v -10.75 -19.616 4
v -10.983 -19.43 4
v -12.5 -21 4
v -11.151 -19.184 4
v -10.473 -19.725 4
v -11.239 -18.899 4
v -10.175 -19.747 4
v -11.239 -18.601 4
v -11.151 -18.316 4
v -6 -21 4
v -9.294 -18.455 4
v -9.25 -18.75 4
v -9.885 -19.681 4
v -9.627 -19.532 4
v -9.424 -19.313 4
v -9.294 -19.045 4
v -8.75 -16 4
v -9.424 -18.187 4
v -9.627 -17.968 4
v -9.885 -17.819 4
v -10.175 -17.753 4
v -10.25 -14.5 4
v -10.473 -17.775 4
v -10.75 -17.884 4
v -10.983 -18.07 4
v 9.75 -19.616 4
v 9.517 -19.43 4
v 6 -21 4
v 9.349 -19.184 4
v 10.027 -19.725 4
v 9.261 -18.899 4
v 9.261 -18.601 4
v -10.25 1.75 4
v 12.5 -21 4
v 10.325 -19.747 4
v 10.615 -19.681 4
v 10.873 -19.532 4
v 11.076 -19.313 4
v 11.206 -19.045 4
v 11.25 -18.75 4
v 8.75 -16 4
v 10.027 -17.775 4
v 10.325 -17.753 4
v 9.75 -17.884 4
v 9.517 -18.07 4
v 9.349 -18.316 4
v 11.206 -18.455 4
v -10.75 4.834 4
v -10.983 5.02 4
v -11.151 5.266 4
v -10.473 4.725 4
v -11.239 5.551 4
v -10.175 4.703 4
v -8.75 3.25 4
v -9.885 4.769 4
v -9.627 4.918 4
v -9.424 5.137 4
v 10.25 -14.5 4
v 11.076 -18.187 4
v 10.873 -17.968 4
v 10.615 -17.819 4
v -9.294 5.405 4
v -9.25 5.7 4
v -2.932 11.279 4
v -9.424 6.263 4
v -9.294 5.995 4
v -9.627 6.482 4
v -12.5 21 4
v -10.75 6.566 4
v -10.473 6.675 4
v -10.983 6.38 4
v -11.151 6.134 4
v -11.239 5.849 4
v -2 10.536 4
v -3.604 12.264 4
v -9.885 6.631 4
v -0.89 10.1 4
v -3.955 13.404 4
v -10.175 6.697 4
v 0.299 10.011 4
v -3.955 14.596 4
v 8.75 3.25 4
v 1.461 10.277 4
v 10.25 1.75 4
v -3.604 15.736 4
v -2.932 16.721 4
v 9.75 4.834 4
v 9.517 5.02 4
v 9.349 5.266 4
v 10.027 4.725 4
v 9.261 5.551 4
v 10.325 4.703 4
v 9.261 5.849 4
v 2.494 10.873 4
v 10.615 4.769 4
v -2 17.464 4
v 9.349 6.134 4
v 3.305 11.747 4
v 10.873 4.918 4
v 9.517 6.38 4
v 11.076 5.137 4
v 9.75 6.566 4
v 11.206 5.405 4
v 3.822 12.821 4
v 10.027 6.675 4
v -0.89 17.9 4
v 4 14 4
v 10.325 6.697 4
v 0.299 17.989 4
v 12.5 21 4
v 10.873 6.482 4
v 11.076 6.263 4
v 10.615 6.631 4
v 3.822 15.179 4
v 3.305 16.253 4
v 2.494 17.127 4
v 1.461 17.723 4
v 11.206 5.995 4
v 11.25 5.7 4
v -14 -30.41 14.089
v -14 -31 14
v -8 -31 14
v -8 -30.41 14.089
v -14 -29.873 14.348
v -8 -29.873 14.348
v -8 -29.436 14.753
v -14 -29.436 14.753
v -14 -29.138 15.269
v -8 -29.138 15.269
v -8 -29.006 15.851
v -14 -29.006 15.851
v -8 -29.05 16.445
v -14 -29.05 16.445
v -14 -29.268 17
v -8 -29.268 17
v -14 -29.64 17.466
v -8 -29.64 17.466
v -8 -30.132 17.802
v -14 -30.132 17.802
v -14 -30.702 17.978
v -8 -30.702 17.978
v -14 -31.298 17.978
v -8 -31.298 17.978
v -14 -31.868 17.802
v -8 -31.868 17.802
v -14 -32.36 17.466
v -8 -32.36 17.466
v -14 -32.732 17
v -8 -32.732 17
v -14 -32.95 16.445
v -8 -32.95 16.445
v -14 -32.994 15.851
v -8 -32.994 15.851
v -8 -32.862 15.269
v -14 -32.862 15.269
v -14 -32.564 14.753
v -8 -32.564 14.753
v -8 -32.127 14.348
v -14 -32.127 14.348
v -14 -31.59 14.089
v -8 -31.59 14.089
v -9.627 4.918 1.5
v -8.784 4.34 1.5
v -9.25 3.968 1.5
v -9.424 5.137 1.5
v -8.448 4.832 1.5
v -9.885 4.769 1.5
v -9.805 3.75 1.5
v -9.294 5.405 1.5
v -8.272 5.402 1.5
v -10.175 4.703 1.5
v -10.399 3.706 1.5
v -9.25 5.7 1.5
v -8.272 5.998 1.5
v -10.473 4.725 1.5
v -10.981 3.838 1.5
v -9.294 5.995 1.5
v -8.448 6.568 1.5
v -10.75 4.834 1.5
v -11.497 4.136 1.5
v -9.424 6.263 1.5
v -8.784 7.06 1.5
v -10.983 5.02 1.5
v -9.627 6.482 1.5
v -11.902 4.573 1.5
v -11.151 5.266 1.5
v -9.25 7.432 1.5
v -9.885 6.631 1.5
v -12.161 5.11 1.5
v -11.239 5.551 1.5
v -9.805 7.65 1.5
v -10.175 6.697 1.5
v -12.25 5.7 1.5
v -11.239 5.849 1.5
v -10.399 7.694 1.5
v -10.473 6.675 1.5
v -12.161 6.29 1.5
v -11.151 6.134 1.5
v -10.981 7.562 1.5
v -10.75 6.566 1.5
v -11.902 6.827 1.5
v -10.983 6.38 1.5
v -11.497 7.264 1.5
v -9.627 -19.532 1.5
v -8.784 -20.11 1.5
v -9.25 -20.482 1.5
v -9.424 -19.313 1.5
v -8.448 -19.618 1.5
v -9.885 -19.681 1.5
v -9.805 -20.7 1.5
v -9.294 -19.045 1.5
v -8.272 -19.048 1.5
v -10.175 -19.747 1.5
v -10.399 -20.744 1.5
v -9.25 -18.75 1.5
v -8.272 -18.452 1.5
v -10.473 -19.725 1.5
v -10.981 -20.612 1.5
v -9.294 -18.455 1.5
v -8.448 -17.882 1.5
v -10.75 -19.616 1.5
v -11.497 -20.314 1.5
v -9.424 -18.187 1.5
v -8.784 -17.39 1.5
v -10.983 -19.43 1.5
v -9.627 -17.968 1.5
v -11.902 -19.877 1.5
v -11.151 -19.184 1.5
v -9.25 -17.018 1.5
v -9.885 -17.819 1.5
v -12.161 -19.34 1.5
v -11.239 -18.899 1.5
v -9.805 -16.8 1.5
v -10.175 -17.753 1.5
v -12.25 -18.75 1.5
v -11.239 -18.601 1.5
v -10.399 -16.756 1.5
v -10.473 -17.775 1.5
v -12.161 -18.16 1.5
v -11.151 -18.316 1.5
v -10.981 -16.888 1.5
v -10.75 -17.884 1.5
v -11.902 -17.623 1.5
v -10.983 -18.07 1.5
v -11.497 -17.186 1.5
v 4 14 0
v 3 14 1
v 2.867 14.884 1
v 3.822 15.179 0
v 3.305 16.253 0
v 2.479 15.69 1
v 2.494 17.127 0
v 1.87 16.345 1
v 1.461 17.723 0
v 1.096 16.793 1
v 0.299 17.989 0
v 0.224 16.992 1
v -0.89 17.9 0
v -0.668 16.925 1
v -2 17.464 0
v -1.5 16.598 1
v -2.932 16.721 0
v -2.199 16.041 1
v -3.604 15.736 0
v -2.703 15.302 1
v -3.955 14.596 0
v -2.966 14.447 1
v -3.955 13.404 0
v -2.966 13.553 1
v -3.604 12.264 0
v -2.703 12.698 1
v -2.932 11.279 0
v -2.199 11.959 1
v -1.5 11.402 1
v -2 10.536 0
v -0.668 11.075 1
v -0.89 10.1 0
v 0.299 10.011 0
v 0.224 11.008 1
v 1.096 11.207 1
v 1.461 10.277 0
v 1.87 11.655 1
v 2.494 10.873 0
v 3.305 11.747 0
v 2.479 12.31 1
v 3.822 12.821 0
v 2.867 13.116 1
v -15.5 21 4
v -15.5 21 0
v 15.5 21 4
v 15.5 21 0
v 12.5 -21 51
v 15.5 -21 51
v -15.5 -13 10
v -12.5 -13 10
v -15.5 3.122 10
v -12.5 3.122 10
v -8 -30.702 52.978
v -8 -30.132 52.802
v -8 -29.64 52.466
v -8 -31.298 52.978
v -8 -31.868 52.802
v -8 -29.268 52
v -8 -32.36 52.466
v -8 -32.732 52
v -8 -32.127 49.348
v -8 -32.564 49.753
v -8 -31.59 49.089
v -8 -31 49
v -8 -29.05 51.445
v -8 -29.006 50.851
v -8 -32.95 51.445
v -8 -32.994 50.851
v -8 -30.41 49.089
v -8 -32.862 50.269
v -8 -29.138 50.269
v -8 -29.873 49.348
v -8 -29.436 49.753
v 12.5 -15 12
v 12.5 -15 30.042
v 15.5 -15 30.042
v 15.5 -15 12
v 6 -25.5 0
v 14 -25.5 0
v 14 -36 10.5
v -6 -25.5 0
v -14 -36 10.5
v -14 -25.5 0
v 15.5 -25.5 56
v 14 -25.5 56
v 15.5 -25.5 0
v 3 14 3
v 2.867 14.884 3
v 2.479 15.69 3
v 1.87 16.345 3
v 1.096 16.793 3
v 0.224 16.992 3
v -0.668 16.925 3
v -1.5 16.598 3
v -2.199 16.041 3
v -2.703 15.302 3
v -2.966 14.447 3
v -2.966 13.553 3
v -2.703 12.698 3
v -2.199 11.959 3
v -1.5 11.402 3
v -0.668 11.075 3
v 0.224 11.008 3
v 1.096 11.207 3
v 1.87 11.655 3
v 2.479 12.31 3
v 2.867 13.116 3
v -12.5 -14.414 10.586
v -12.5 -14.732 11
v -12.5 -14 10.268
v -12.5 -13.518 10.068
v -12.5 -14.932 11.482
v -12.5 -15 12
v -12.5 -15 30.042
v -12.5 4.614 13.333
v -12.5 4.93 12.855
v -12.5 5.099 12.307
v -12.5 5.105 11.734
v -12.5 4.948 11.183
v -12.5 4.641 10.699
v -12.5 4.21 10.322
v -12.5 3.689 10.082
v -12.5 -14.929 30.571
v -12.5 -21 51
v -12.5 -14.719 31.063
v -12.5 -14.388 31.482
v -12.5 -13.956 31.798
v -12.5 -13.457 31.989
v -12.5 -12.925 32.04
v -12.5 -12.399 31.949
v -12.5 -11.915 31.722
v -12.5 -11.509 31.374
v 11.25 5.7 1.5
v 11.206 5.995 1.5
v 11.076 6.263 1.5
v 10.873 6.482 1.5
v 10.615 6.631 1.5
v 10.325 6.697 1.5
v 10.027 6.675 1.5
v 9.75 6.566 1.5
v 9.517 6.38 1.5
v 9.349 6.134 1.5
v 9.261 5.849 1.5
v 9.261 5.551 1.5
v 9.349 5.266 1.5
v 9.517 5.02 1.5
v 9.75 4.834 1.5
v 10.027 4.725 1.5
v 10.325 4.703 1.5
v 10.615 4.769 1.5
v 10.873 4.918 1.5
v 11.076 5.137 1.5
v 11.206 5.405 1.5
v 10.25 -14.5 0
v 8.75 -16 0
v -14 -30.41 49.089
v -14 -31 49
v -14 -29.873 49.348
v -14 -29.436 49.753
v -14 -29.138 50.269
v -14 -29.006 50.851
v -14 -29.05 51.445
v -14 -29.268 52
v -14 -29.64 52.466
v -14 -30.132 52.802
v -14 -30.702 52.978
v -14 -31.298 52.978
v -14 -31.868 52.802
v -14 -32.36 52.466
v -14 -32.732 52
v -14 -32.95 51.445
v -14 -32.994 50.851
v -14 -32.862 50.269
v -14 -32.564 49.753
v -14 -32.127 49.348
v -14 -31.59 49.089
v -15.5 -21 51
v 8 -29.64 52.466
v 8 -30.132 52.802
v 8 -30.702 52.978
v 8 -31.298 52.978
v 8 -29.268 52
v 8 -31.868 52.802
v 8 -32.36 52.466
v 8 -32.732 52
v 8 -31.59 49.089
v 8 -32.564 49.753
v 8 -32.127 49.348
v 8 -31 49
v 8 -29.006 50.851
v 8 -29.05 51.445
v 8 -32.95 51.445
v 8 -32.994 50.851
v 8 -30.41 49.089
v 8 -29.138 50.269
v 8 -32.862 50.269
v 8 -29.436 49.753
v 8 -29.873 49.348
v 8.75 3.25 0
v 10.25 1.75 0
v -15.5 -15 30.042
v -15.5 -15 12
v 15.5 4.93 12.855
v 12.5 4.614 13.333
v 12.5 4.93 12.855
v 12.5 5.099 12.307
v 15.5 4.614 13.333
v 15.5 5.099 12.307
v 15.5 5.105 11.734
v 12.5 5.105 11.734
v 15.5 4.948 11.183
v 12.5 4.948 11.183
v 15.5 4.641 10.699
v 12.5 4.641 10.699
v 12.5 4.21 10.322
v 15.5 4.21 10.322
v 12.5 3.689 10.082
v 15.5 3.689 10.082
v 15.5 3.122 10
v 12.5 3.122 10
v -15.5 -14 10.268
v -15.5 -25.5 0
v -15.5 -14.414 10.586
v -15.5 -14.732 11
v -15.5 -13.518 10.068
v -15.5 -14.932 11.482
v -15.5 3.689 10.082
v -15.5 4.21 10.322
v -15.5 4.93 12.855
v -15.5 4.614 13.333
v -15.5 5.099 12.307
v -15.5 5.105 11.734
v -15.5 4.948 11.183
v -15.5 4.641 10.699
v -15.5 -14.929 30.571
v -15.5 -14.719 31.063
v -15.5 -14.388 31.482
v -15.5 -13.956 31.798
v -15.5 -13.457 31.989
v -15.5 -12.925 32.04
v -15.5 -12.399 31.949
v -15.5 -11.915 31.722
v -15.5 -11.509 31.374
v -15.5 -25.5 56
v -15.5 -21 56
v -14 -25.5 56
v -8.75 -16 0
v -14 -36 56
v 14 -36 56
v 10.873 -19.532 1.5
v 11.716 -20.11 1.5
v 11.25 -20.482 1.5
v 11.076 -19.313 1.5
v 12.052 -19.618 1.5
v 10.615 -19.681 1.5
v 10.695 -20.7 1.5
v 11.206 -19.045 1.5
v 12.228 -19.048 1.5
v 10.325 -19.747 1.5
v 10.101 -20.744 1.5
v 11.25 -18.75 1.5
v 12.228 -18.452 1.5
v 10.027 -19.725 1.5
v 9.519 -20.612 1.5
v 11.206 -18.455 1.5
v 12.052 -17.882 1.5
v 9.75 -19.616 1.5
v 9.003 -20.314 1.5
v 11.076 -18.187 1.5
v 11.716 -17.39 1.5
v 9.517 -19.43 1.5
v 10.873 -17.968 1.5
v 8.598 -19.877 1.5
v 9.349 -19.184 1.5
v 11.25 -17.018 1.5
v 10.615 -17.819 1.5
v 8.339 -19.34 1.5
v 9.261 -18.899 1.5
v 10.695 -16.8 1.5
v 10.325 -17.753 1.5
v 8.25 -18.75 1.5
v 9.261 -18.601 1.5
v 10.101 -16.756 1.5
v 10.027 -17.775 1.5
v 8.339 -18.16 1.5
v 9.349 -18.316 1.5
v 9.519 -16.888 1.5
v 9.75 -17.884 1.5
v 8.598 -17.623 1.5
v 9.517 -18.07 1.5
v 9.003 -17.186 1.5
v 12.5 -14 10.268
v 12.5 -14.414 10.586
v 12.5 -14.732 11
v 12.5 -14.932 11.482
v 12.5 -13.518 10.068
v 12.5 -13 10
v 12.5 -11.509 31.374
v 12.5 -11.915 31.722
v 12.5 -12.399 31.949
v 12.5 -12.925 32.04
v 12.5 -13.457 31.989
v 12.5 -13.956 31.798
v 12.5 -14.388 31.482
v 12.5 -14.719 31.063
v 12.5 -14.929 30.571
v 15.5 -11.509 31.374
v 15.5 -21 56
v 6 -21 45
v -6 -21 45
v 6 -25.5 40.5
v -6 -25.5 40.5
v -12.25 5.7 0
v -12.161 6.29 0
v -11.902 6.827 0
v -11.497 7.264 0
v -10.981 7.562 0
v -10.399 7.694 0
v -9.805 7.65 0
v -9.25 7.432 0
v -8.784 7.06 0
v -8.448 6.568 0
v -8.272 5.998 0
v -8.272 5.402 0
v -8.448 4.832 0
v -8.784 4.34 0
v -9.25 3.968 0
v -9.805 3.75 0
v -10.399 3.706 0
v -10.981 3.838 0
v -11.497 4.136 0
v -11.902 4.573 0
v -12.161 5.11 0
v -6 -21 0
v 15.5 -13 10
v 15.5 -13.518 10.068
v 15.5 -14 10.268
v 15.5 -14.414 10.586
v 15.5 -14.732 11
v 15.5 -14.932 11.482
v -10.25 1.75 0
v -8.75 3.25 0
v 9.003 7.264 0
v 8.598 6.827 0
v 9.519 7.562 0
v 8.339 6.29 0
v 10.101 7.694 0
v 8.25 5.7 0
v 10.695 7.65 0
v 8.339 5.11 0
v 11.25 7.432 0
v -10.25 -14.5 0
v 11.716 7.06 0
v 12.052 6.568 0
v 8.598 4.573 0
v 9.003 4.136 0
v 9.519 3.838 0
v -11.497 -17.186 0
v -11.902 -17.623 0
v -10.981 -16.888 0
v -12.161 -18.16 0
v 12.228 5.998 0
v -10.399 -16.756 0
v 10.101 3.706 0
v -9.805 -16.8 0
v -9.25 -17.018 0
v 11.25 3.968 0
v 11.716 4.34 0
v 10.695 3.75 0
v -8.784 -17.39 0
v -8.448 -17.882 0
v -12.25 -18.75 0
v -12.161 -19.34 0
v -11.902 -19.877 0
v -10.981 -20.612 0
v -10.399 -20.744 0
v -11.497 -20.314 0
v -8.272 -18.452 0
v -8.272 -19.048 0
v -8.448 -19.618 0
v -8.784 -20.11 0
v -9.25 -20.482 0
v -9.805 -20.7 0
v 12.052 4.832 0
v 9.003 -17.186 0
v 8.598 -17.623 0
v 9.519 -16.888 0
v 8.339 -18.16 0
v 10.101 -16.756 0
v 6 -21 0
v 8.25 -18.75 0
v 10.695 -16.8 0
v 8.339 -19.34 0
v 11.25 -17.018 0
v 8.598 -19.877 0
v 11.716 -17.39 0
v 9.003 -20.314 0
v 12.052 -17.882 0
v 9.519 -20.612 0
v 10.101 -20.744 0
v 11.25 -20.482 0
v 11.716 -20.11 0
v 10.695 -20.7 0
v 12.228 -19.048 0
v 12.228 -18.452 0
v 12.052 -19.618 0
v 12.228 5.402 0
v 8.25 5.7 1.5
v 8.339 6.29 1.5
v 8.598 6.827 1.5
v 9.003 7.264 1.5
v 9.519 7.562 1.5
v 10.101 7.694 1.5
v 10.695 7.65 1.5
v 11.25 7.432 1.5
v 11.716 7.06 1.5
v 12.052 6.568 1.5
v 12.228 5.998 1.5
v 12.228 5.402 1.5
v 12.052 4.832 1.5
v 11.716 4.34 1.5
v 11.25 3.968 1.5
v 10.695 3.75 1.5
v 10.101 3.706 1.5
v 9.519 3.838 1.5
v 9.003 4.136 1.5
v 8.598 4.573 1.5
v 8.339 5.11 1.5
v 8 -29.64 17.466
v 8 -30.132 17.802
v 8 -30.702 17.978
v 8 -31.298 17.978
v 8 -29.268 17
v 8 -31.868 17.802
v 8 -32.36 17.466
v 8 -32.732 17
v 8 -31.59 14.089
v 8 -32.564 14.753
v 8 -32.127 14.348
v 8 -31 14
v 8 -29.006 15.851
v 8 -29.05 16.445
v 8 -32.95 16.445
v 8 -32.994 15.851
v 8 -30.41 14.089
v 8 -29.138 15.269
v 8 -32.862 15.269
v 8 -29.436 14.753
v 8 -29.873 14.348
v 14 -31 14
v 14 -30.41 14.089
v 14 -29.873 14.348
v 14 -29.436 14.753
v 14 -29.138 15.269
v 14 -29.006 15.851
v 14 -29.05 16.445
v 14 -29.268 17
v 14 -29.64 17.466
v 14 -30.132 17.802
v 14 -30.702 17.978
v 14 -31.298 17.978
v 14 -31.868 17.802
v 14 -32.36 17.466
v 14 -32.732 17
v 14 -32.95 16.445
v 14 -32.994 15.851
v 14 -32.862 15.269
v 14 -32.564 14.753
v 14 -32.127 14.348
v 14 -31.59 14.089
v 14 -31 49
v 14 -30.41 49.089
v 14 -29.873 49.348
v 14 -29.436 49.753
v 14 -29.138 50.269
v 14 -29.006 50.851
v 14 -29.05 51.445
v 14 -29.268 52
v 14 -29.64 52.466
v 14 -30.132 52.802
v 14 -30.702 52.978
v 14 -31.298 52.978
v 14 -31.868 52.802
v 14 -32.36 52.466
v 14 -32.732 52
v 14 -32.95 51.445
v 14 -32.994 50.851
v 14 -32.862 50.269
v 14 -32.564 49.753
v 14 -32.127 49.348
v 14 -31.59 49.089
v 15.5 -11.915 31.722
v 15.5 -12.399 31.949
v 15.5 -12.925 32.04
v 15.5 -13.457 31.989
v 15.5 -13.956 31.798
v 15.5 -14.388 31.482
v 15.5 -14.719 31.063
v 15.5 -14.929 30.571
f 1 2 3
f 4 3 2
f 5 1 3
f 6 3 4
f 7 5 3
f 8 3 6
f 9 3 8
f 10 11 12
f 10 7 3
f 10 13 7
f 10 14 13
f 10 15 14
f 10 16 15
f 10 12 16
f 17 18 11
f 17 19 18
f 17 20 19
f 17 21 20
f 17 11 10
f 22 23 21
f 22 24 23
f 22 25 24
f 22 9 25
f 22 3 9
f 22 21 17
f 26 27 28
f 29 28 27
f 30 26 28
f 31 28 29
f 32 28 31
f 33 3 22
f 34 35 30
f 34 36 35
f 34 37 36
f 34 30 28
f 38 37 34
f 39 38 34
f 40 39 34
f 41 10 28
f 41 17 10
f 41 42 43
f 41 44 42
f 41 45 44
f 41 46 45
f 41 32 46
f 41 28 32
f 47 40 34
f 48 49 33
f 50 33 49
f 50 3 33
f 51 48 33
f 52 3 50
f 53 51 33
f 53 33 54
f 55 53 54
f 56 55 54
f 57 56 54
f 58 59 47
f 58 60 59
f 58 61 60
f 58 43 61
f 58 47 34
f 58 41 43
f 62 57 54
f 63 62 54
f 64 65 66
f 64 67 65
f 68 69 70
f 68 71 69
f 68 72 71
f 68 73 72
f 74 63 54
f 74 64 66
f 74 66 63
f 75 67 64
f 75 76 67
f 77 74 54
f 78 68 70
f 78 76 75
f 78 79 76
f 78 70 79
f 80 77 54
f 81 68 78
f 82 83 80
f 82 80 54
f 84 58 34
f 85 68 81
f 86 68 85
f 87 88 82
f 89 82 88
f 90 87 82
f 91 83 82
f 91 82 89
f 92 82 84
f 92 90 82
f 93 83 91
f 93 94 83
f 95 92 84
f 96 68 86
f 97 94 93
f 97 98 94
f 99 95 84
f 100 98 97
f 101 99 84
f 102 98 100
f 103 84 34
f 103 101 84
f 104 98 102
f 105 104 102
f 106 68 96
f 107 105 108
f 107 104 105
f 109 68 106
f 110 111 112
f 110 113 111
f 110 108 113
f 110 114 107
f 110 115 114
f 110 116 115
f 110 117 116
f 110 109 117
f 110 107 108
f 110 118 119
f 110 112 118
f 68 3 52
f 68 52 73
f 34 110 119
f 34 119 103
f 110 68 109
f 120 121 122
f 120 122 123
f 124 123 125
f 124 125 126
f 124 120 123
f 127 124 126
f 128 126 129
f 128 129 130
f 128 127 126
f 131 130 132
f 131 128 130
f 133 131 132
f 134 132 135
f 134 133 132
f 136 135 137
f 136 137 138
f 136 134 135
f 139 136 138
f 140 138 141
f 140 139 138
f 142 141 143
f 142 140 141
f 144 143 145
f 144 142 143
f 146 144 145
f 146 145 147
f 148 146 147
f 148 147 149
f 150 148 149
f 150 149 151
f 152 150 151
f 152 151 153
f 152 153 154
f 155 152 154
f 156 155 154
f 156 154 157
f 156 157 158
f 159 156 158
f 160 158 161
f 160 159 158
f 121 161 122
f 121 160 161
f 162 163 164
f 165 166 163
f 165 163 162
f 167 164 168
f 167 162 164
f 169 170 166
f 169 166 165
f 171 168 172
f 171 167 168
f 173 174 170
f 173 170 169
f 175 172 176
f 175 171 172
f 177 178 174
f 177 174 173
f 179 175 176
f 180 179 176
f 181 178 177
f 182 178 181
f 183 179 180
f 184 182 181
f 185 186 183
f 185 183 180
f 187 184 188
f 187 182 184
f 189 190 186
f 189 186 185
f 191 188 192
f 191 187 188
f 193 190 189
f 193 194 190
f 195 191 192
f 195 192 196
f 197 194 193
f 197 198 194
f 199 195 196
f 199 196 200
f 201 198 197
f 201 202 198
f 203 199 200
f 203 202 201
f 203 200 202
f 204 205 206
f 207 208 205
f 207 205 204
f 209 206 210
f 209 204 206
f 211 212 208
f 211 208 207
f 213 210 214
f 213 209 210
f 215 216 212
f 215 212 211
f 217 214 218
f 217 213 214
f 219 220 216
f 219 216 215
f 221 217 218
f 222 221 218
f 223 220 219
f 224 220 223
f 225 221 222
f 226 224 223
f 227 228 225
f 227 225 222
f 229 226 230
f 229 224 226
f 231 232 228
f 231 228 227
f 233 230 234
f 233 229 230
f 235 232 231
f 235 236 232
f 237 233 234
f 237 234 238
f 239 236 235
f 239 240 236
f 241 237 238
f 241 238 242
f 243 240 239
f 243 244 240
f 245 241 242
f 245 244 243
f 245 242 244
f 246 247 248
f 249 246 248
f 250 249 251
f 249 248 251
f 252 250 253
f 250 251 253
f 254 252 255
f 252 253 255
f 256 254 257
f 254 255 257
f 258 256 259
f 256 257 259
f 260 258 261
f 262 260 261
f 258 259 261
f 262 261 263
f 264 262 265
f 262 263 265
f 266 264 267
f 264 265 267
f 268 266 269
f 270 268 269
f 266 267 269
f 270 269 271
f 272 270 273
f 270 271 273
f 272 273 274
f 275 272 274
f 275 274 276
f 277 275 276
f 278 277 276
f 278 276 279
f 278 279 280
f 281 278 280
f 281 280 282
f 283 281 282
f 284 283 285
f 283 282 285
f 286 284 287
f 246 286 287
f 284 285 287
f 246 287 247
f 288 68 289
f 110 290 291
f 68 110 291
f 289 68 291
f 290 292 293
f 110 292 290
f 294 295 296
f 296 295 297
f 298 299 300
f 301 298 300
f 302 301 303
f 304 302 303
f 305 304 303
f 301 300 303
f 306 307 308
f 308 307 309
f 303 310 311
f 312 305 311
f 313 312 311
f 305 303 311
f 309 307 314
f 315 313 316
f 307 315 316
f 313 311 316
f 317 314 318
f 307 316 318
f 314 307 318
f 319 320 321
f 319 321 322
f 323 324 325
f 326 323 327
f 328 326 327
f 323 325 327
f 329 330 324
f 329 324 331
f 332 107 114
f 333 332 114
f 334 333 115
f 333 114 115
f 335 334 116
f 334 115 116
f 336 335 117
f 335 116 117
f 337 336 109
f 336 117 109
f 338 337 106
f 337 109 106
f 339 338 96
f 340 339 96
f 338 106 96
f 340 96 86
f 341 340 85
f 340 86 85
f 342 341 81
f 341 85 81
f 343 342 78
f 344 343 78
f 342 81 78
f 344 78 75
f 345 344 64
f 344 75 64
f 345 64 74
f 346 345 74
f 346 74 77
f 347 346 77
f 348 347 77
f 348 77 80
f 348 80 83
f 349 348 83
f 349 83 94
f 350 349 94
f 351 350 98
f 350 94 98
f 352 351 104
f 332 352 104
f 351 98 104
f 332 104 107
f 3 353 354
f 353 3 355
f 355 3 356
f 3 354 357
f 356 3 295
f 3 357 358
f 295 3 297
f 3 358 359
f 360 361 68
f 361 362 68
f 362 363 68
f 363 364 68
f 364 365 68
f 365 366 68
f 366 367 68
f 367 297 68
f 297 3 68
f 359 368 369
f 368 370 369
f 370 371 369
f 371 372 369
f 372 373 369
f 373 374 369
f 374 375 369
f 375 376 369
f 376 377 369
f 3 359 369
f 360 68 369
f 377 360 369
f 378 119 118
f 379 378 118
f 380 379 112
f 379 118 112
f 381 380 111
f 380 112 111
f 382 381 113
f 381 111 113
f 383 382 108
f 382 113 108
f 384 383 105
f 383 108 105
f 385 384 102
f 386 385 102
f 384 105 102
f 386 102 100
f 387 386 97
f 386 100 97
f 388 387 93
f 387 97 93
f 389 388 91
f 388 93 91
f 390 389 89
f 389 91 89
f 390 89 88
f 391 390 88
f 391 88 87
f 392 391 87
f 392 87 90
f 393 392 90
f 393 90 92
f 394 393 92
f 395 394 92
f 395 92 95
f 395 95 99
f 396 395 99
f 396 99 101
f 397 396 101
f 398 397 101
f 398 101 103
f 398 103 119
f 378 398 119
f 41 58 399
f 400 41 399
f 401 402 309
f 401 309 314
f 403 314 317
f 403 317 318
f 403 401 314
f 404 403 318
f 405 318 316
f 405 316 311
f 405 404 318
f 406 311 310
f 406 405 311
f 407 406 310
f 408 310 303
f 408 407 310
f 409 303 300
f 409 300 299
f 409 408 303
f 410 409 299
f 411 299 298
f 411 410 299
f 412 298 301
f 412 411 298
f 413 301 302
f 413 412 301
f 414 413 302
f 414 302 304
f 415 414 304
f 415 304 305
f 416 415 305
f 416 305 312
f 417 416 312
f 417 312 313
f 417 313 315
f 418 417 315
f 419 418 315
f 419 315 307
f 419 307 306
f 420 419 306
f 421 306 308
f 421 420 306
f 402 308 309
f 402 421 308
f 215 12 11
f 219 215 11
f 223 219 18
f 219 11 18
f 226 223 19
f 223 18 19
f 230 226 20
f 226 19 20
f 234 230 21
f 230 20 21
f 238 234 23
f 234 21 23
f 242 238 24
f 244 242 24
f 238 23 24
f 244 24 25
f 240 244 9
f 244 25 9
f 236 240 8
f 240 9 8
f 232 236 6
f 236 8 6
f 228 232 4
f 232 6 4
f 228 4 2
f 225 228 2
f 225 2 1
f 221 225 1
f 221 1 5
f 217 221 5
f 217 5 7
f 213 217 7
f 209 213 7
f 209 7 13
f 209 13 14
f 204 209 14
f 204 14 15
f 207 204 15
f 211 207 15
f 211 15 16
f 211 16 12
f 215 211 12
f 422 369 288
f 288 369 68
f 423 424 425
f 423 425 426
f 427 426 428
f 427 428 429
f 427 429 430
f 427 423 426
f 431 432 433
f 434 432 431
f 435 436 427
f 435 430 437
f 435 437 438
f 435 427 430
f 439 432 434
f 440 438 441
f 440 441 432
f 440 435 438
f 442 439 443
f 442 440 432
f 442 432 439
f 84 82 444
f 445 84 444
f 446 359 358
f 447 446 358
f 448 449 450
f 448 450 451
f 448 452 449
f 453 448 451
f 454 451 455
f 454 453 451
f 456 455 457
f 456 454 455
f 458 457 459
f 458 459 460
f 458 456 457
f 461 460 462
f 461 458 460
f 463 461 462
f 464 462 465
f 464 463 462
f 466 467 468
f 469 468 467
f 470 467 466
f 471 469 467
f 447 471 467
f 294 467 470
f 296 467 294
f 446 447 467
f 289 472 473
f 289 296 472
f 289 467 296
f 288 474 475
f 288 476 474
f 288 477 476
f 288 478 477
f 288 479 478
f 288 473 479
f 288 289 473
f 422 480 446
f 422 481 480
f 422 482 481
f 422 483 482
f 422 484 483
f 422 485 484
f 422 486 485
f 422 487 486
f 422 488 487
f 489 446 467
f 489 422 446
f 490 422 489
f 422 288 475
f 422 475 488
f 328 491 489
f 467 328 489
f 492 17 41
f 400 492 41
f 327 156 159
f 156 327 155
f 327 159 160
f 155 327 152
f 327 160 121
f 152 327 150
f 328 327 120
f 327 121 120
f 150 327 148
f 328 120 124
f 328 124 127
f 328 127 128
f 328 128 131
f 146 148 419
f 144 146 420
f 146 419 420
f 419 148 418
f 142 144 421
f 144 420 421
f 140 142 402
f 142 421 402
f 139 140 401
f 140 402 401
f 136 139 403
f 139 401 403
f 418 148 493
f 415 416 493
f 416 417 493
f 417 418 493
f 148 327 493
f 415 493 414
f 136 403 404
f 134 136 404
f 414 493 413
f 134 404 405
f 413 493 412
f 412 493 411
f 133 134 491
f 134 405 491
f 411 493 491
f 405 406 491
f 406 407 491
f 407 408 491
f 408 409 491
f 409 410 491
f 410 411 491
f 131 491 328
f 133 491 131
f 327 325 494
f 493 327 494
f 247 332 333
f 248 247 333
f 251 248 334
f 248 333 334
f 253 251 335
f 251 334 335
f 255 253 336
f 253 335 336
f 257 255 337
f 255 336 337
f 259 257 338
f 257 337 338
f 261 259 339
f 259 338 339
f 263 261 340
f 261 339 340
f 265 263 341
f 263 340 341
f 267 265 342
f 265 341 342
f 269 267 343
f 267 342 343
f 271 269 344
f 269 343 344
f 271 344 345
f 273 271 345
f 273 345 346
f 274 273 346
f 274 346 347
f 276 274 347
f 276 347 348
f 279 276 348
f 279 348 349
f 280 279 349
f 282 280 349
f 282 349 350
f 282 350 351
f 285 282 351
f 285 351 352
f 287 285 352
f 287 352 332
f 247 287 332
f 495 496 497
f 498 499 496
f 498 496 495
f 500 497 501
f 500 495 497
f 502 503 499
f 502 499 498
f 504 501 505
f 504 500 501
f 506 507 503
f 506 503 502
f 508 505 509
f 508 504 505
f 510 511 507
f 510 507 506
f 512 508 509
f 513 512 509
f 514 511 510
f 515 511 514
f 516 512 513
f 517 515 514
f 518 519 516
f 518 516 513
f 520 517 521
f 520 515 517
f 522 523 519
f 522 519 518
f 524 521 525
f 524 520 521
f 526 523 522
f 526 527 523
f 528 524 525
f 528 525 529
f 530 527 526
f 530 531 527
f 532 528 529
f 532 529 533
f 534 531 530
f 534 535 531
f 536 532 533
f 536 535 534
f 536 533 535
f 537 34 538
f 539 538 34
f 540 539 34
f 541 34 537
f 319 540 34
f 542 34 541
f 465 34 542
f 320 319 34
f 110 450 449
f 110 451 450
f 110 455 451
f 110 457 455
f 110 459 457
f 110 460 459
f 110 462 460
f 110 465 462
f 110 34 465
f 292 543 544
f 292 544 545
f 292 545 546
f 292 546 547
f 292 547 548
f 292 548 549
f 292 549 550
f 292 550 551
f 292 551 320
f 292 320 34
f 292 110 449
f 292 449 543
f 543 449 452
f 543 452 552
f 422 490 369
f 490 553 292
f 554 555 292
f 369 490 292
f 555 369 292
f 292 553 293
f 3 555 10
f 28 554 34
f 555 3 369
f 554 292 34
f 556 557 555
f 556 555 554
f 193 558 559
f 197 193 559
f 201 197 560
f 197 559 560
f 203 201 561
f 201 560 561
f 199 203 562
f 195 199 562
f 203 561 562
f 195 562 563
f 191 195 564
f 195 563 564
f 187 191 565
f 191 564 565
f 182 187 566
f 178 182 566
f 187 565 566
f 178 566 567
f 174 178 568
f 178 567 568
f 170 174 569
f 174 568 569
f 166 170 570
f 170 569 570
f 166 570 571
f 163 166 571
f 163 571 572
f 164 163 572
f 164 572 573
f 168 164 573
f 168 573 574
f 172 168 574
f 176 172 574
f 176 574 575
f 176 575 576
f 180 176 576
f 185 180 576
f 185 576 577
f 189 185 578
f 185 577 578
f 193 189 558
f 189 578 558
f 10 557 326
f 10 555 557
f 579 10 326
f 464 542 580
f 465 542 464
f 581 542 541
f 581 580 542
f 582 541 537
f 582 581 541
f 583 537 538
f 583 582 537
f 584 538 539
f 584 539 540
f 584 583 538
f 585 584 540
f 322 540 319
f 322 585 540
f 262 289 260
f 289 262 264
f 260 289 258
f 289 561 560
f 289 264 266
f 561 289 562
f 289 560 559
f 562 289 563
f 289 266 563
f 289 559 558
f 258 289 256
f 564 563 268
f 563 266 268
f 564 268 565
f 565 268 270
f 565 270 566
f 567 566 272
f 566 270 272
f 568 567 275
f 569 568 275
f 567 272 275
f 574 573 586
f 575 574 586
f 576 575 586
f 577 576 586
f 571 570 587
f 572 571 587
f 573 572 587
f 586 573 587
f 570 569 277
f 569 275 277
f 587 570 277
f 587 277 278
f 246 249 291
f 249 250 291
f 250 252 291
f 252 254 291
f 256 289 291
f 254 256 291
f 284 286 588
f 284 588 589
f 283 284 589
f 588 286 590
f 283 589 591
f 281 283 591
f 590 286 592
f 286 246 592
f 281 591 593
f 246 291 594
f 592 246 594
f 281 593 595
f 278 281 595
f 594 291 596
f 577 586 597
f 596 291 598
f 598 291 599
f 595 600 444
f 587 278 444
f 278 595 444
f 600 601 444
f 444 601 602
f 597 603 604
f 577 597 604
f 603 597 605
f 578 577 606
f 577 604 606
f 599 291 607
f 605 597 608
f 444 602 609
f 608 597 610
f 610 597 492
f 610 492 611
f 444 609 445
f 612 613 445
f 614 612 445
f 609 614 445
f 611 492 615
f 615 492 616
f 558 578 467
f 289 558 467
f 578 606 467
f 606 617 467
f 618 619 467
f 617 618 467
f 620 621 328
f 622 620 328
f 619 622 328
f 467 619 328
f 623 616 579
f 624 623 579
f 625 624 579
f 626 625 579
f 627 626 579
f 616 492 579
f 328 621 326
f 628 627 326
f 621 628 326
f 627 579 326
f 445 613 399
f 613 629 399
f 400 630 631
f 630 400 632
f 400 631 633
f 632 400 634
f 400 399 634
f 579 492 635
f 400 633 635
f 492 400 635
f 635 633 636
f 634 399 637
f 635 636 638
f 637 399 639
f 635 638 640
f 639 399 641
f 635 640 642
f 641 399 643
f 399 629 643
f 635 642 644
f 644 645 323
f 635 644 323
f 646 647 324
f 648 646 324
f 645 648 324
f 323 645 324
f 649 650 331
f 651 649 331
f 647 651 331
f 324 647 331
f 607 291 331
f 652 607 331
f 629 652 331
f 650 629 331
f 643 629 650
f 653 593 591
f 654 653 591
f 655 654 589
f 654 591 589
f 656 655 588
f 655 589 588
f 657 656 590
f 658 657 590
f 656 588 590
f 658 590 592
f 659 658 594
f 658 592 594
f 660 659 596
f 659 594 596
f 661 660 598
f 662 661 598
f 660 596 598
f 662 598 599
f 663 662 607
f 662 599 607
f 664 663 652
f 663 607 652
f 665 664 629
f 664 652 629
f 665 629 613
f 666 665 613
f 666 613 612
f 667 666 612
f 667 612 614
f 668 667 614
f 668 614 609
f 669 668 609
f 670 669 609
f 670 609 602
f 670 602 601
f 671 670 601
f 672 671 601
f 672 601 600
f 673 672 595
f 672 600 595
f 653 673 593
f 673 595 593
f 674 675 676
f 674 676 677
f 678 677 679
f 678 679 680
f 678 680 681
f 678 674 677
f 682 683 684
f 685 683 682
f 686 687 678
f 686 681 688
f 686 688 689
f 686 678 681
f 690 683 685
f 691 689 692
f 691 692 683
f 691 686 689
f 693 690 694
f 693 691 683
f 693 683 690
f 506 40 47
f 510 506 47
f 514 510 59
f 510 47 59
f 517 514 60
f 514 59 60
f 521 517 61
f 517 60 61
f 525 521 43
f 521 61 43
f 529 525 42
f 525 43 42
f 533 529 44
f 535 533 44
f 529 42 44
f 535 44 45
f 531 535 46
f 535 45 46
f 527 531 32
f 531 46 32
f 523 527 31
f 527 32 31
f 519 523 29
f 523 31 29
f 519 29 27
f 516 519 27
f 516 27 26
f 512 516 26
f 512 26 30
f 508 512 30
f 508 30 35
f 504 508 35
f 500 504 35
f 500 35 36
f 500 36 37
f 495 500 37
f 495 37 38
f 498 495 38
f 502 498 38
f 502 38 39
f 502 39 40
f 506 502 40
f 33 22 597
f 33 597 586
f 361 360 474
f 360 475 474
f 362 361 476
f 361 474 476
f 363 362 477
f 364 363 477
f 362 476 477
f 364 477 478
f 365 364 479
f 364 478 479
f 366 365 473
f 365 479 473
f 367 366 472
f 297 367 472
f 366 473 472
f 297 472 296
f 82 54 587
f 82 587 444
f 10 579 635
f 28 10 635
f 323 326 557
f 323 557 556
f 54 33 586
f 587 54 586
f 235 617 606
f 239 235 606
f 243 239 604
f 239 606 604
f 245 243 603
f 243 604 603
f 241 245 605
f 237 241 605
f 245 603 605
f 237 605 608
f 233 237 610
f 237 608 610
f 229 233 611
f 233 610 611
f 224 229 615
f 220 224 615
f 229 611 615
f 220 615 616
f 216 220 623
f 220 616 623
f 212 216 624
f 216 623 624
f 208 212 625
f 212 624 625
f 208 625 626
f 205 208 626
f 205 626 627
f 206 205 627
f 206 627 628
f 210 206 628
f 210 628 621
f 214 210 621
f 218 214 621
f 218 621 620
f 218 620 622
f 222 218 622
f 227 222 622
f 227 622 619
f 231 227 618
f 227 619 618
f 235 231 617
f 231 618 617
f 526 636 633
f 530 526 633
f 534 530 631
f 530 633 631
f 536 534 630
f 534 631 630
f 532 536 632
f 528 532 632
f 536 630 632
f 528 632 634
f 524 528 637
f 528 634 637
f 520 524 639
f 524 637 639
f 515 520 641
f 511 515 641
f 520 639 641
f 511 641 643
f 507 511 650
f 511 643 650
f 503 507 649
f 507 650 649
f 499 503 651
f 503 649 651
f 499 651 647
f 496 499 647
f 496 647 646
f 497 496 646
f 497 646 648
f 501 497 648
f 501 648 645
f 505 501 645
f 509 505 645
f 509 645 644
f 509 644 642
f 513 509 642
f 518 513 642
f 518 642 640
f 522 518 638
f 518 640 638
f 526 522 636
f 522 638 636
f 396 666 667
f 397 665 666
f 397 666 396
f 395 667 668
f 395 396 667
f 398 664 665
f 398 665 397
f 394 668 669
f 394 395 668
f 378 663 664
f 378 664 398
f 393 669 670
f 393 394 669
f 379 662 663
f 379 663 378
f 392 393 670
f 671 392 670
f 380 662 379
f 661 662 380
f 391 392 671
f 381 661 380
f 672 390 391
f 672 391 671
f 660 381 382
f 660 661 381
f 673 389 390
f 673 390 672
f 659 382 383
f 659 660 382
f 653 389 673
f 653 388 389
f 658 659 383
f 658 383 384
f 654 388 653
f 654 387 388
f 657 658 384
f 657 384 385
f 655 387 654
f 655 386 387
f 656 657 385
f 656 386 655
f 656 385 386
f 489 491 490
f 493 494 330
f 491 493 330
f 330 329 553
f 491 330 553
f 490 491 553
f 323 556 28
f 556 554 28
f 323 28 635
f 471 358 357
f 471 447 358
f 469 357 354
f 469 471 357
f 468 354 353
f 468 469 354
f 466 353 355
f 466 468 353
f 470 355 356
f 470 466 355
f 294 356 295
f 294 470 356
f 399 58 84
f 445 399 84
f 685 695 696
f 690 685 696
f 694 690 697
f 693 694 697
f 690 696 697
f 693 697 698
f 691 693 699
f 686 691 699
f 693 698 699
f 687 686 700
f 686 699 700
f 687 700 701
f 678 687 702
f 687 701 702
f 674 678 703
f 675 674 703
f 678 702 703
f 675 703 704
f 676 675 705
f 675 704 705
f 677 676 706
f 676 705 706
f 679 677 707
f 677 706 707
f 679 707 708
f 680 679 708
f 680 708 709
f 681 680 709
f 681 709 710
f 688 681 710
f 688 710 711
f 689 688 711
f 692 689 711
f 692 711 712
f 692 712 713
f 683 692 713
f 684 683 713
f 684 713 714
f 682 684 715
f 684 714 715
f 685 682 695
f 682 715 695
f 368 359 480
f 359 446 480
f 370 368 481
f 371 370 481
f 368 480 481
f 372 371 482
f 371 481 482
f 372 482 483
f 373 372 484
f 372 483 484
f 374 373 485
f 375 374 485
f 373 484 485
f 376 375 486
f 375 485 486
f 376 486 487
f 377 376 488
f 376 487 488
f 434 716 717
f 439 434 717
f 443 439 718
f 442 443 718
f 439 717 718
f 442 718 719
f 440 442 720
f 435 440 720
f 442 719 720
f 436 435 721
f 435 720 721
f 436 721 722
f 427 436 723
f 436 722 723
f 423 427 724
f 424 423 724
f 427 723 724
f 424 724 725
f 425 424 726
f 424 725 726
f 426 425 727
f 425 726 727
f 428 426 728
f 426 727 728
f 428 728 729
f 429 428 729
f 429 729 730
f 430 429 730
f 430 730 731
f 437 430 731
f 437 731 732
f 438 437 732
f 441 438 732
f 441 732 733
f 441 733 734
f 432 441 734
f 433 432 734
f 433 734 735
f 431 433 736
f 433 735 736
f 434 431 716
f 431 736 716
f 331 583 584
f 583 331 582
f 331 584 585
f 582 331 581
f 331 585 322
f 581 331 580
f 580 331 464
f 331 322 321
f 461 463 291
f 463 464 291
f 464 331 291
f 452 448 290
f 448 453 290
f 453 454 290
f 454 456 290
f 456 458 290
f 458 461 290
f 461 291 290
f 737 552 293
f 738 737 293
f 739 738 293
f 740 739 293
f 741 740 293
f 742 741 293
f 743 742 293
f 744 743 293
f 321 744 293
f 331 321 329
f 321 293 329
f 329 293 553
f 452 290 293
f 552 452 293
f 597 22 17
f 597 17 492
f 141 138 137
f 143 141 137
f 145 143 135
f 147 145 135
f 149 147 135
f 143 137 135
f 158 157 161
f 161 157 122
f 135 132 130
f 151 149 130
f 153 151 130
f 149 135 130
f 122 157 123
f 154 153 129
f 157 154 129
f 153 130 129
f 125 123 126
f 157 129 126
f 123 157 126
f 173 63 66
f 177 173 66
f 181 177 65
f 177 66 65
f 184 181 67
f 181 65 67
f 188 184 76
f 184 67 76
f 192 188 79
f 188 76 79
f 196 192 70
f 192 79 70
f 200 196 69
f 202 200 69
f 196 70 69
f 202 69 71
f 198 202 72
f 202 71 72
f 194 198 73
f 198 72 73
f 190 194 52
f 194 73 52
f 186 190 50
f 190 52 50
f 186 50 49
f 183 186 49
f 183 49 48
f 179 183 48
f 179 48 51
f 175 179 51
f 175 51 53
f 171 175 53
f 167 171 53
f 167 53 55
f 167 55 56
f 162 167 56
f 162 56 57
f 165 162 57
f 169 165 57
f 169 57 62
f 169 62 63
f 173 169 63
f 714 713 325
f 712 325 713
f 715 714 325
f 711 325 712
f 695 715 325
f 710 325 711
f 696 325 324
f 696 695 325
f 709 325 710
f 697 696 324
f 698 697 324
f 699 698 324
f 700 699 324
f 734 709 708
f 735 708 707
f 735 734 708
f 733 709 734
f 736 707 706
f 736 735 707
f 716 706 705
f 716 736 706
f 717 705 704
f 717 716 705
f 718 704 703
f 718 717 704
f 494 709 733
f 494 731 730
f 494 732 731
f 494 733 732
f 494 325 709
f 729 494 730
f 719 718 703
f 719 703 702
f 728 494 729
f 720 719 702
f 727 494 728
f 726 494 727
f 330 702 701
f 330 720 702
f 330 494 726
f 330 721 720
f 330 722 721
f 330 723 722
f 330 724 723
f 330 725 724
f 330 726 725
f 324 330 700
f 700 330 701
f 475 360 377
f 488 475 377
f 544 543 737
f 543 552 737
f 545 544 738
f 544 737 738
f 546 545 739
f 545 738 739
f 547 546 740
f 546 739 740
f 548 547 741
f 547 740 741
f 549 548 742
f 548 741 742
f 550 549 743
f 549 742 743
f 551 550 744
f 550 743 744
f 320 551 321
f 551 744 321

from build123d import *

# Parameters (mm, degrees)
SKETCH2_W           = 25
SKETCH2_H           = 42
BOSS_EXTRUDE1_DEPTH = 4
SKETCH5_W           = 56
SKETCH5_H           = 15
BOSS_EXTRUDE2_DEPTH = 25
BOSS_EXTRUDE3_DEPTH = 3
SKETCH7_W           = 1.5
SKETCH7_H           = 10.5
CUT_EXTRUDE1_DEPTH  = 69.353858706
SKETCH9_R           = 2
CUT_EXTRUDE2_DEPTH  = 6
CHAMFER1_SIZE       = 10.5
SKETCH10_R          = 1
CUT_EXTRUDE3_DEPTH  = 66.117202028
SKETCH11_W          = 20.5
SKETCH11_H          = 19.25
CUT_EXTRUDE4_DEPTH  = 66.117202028
CHAMFER3_SIZE       = 1.5
SKETCH12_R          = 3
CUT_EXTRUDE5_DEPTH  = 66.117202028
CHAMFER4_SIZE       = 1
SKETCH13_R          = 2
CUT_EXTRUDE6_DEPTH  = 1.5
CUT_EXTRUDE7_DEPTH  = 73.221880341
FILLET1_R           = 2
SKETCH16_W          = 12
SKETCH16_H          = 45
CUT_EXTRUDE8_DEPTH  = 4.5
CHAMFER5_SIZE       = 4.5


with BuildPart() as part:
    # Sketch2 → Boss-Extrude1 (new body)
    with BuildSketch(Plane.XY):
        Rectangle(SKETCH2_W, SKETCH2_H)
    extrude(amount=BOSS_EXTRUDE1_DEPTH)

    # Sketch5 → Boss-Extrude2 (add, through all)
    with BuildSketch(Plane(origin=(12.5, 0, 0), x_dir=(0, 0, -1), z_dir=(1, 0, 0))):
        with Locations((-28, -28.5)):
            Rectangle(SKETCH5_W, SKETCH5_H)
    extrude(amount=-BOSS_EXTRUDE2_DEPTH)

    # Sketch6 → Boss-Extrude3 (add)
    with BuildSketch(Plane(origin=(12.5, 0, 0), x_dir=(0, 0, -1), z_dir=(1, 0, 0))):
        Polygon((-4, 21), (0, 21), (0, -36), (-56, -36), (-56, -21), (-51, -21), align=None)
    boss_extrude3 = extrude(amount=BOSS_EXTRUDE3_DEPTH)

    # Sketch7 → Cut-Extrude1 (cut, through all)
    with BuildSketch(Plane.XY.offset(56)):
        with Locations((14.75, -30.75)):
            Rectangle(SKETCH7_W, SKETCH7_H)
    cut_extrude1 = extrude(amount=-CUT_EXTRUDE1_DEPTH, mode=Mode.SUBTRACT)

    # Sketch9 → Cut-Extrude2 (cut)
    with BuildSketch(Plane(origin=(14, 0, 0), x_dir=(0, 0, -1), z_dir=(1, 0, 0))):
        with Locations((-51, -31)):
            Circle(SKETCH9_R)
        with Locations((-16, -31)):
            Circle(SKETCH9_R)
    cut_extrude2 = extrude(amount=-CUT_EXTRUDE2_DEPTH, mode=Mode.SUBTRACT)

    # Mirror1: Boss-Extrude3, Cut-Extrude1, Cut-Extrude2 across plane
    add(boss_extrude3.mirror(Plane(origin=(0, 0, 0), x_dir=(0, 0, 1), z_dir=(1, 0, 0))))
    add(cut_extrude1.mirror(Plane(origin=(0, 0, 0), x_dir=(0, 0, 1), z_dir=(1, 0, 0))), mode=Mode.SUBTRACT)
    add(cut_extrude2.mirror(Plane(origin=(0, 0, 0), x_dir=(0, 0, 1), z_dir=(1, 0, 0))), mode=Mode.SUBTRACT)

    # Chamfer1
    chamfer1_edges = [part.edges().sort_by_distance(p)[0] for p in [
        (0, -36, 0),
    ]]
    chamfer(chamfer1_edges, length=CHAMFER1_SIZE)

    # Sketch10 → Cut-Extrude3 (cut, through all)
    with BuildSketch(Plane.XY.offset(4)):
        with Locations((-10.25, 5.7)):
            Circle(SKETCH10_R)
        with Locations((10.25, 5.7)):
            Circle(SKETCH10_R)
        with Locations((10.25, -18.75)):
            Circle(SKETCH10_R)
        with Locations((-10.25, -18.75)):
            Circle(SKETCH10_R)
    extrude(amount=-CUT_EXTRUDE3_DEPTH, mode=Mode.SUBTRACT)

    # Sketch11 → Cut-Extrude4 (cut, through all)
    with BuildSketch(Plane.XY.offset(4)):
        with Locations((0, -6.375)):
            Rectangle(SKETCH11_W, SKETCH11_H)
    extrude(amount=-CUT_EXTRUDE4_DEPTH, mode=Mode.SUBTRACT)

    # Chamfer3
    chamfer3_edges = [part.edges().sort_by_distance(p)[0] for p in [
        (10.25, 3.25, 2),
        (10.25, -16, 2),
        (-10.25, -16, 2),
        (-10.25, 3.25, 2),
    ]]
    chamfer(chamfer3_edges, length=CHAMFER3_SIZE)

    # Sketch12 → Cut-Extrude5 (cut, through all)
    with BuildSketch(Plane.XY.offset(4)):
        with Locations((0, 14)):
            Circle(SKETCH12_R)
    extrude(amount=-CUT_EXTRUDE5_DEPTH, mode=Mode.SUBTRACT)

    # Chamfer4
    chamfer4_edges = [part.edges().sort_by_distance(p)[0] for p in [
        (-3, 14, 0),
        (-3, 14, 4),
    ]]
    chamfer(chamfer4_edges, length=CHAMFER4_SIZE)

    # Sketch13 → Cut-Extrude6 (cut)
    with BuildSketch(Plane(origin=(0, 0, 0), x_dir=(-1, 0, 0), z_dir=(0, 0, -1))):
        with Locations((-10.25, 5.7)):
            Circle(SKETCH13_R)
        with Locations((10.25, 5.7)):
            Circle(SKETCH13_R)
        with Locations((10.25, -18.75)):
            Circle(SKETCH13_R)
        with Locations((-10.25, -18.75)):
            Circle(SKETCH13_R)
    extrude(amount=-CUT_EXTRUDE6_DEPTH, mode=Mode.SUBTRACT)

    # Sketch14 → Cut-Extrude7 (cut, through all)
    with BuildSketch(Plane(origin=(-12.5, 0, 0), x_dir=(0, 0, -1), z_dir=(1, 0, 0))):
        Polygon((-35.28118028, -15), (-10, -15), (-10, 7.591693017), align=None)
    cut_extrude7 = extrude(amount=-CUT_EXTRUDE7_DEPTH, mode=Mode.SUBTRACT)

    # Mirror2: Cut-Extrude7 across plane
    add(cut_extrude7.mirror(Plane(origin=(0, 0, 0), x_dir=(0, 0, 1), z_dir=(1, 0, 0))), mode=Mode.SUBTRACT)

    # Fillet1
    fillet1_edges = [part.edges().sort_by_distance(p)[0] for p in [
        (-14, -15, 35.28118028),
        (-14, 7.591693017, 10),
        (-14, -15, 10),
        (14, 7.591693017, 10),
        (14, -15, 35.28118028),
        (14, -15, 10),
    ]]
    fillet(fillet1_edges, radius=FILLET1_R)

    # Sketch16 → Cut-Extrude8 (cut)
    with BuildSketch(Plane(origin=(0, -21, 0), x_dir=(1, 0, 0), z_dir=(0, 1, 0))):
        with Locations((0, -22.5)):
            Rectangle(SKETCH16_W, SKETCH16_H)
    extrude(amount=-CUT_EXTRUDE8_DEPTH, mode=Mode.SUBTRACT)

    # Chamfer5
    chamfer5_edges = [part.edges().sort_by_distance(p)[0] for p in [
        (0, -25.5, 45),
    ]]
    chamfer(chamfer5_edges, length=CHAMFER5_SIZE - 0.0001)  # a hair under: the kernel refuses the full size


solid = part.part
